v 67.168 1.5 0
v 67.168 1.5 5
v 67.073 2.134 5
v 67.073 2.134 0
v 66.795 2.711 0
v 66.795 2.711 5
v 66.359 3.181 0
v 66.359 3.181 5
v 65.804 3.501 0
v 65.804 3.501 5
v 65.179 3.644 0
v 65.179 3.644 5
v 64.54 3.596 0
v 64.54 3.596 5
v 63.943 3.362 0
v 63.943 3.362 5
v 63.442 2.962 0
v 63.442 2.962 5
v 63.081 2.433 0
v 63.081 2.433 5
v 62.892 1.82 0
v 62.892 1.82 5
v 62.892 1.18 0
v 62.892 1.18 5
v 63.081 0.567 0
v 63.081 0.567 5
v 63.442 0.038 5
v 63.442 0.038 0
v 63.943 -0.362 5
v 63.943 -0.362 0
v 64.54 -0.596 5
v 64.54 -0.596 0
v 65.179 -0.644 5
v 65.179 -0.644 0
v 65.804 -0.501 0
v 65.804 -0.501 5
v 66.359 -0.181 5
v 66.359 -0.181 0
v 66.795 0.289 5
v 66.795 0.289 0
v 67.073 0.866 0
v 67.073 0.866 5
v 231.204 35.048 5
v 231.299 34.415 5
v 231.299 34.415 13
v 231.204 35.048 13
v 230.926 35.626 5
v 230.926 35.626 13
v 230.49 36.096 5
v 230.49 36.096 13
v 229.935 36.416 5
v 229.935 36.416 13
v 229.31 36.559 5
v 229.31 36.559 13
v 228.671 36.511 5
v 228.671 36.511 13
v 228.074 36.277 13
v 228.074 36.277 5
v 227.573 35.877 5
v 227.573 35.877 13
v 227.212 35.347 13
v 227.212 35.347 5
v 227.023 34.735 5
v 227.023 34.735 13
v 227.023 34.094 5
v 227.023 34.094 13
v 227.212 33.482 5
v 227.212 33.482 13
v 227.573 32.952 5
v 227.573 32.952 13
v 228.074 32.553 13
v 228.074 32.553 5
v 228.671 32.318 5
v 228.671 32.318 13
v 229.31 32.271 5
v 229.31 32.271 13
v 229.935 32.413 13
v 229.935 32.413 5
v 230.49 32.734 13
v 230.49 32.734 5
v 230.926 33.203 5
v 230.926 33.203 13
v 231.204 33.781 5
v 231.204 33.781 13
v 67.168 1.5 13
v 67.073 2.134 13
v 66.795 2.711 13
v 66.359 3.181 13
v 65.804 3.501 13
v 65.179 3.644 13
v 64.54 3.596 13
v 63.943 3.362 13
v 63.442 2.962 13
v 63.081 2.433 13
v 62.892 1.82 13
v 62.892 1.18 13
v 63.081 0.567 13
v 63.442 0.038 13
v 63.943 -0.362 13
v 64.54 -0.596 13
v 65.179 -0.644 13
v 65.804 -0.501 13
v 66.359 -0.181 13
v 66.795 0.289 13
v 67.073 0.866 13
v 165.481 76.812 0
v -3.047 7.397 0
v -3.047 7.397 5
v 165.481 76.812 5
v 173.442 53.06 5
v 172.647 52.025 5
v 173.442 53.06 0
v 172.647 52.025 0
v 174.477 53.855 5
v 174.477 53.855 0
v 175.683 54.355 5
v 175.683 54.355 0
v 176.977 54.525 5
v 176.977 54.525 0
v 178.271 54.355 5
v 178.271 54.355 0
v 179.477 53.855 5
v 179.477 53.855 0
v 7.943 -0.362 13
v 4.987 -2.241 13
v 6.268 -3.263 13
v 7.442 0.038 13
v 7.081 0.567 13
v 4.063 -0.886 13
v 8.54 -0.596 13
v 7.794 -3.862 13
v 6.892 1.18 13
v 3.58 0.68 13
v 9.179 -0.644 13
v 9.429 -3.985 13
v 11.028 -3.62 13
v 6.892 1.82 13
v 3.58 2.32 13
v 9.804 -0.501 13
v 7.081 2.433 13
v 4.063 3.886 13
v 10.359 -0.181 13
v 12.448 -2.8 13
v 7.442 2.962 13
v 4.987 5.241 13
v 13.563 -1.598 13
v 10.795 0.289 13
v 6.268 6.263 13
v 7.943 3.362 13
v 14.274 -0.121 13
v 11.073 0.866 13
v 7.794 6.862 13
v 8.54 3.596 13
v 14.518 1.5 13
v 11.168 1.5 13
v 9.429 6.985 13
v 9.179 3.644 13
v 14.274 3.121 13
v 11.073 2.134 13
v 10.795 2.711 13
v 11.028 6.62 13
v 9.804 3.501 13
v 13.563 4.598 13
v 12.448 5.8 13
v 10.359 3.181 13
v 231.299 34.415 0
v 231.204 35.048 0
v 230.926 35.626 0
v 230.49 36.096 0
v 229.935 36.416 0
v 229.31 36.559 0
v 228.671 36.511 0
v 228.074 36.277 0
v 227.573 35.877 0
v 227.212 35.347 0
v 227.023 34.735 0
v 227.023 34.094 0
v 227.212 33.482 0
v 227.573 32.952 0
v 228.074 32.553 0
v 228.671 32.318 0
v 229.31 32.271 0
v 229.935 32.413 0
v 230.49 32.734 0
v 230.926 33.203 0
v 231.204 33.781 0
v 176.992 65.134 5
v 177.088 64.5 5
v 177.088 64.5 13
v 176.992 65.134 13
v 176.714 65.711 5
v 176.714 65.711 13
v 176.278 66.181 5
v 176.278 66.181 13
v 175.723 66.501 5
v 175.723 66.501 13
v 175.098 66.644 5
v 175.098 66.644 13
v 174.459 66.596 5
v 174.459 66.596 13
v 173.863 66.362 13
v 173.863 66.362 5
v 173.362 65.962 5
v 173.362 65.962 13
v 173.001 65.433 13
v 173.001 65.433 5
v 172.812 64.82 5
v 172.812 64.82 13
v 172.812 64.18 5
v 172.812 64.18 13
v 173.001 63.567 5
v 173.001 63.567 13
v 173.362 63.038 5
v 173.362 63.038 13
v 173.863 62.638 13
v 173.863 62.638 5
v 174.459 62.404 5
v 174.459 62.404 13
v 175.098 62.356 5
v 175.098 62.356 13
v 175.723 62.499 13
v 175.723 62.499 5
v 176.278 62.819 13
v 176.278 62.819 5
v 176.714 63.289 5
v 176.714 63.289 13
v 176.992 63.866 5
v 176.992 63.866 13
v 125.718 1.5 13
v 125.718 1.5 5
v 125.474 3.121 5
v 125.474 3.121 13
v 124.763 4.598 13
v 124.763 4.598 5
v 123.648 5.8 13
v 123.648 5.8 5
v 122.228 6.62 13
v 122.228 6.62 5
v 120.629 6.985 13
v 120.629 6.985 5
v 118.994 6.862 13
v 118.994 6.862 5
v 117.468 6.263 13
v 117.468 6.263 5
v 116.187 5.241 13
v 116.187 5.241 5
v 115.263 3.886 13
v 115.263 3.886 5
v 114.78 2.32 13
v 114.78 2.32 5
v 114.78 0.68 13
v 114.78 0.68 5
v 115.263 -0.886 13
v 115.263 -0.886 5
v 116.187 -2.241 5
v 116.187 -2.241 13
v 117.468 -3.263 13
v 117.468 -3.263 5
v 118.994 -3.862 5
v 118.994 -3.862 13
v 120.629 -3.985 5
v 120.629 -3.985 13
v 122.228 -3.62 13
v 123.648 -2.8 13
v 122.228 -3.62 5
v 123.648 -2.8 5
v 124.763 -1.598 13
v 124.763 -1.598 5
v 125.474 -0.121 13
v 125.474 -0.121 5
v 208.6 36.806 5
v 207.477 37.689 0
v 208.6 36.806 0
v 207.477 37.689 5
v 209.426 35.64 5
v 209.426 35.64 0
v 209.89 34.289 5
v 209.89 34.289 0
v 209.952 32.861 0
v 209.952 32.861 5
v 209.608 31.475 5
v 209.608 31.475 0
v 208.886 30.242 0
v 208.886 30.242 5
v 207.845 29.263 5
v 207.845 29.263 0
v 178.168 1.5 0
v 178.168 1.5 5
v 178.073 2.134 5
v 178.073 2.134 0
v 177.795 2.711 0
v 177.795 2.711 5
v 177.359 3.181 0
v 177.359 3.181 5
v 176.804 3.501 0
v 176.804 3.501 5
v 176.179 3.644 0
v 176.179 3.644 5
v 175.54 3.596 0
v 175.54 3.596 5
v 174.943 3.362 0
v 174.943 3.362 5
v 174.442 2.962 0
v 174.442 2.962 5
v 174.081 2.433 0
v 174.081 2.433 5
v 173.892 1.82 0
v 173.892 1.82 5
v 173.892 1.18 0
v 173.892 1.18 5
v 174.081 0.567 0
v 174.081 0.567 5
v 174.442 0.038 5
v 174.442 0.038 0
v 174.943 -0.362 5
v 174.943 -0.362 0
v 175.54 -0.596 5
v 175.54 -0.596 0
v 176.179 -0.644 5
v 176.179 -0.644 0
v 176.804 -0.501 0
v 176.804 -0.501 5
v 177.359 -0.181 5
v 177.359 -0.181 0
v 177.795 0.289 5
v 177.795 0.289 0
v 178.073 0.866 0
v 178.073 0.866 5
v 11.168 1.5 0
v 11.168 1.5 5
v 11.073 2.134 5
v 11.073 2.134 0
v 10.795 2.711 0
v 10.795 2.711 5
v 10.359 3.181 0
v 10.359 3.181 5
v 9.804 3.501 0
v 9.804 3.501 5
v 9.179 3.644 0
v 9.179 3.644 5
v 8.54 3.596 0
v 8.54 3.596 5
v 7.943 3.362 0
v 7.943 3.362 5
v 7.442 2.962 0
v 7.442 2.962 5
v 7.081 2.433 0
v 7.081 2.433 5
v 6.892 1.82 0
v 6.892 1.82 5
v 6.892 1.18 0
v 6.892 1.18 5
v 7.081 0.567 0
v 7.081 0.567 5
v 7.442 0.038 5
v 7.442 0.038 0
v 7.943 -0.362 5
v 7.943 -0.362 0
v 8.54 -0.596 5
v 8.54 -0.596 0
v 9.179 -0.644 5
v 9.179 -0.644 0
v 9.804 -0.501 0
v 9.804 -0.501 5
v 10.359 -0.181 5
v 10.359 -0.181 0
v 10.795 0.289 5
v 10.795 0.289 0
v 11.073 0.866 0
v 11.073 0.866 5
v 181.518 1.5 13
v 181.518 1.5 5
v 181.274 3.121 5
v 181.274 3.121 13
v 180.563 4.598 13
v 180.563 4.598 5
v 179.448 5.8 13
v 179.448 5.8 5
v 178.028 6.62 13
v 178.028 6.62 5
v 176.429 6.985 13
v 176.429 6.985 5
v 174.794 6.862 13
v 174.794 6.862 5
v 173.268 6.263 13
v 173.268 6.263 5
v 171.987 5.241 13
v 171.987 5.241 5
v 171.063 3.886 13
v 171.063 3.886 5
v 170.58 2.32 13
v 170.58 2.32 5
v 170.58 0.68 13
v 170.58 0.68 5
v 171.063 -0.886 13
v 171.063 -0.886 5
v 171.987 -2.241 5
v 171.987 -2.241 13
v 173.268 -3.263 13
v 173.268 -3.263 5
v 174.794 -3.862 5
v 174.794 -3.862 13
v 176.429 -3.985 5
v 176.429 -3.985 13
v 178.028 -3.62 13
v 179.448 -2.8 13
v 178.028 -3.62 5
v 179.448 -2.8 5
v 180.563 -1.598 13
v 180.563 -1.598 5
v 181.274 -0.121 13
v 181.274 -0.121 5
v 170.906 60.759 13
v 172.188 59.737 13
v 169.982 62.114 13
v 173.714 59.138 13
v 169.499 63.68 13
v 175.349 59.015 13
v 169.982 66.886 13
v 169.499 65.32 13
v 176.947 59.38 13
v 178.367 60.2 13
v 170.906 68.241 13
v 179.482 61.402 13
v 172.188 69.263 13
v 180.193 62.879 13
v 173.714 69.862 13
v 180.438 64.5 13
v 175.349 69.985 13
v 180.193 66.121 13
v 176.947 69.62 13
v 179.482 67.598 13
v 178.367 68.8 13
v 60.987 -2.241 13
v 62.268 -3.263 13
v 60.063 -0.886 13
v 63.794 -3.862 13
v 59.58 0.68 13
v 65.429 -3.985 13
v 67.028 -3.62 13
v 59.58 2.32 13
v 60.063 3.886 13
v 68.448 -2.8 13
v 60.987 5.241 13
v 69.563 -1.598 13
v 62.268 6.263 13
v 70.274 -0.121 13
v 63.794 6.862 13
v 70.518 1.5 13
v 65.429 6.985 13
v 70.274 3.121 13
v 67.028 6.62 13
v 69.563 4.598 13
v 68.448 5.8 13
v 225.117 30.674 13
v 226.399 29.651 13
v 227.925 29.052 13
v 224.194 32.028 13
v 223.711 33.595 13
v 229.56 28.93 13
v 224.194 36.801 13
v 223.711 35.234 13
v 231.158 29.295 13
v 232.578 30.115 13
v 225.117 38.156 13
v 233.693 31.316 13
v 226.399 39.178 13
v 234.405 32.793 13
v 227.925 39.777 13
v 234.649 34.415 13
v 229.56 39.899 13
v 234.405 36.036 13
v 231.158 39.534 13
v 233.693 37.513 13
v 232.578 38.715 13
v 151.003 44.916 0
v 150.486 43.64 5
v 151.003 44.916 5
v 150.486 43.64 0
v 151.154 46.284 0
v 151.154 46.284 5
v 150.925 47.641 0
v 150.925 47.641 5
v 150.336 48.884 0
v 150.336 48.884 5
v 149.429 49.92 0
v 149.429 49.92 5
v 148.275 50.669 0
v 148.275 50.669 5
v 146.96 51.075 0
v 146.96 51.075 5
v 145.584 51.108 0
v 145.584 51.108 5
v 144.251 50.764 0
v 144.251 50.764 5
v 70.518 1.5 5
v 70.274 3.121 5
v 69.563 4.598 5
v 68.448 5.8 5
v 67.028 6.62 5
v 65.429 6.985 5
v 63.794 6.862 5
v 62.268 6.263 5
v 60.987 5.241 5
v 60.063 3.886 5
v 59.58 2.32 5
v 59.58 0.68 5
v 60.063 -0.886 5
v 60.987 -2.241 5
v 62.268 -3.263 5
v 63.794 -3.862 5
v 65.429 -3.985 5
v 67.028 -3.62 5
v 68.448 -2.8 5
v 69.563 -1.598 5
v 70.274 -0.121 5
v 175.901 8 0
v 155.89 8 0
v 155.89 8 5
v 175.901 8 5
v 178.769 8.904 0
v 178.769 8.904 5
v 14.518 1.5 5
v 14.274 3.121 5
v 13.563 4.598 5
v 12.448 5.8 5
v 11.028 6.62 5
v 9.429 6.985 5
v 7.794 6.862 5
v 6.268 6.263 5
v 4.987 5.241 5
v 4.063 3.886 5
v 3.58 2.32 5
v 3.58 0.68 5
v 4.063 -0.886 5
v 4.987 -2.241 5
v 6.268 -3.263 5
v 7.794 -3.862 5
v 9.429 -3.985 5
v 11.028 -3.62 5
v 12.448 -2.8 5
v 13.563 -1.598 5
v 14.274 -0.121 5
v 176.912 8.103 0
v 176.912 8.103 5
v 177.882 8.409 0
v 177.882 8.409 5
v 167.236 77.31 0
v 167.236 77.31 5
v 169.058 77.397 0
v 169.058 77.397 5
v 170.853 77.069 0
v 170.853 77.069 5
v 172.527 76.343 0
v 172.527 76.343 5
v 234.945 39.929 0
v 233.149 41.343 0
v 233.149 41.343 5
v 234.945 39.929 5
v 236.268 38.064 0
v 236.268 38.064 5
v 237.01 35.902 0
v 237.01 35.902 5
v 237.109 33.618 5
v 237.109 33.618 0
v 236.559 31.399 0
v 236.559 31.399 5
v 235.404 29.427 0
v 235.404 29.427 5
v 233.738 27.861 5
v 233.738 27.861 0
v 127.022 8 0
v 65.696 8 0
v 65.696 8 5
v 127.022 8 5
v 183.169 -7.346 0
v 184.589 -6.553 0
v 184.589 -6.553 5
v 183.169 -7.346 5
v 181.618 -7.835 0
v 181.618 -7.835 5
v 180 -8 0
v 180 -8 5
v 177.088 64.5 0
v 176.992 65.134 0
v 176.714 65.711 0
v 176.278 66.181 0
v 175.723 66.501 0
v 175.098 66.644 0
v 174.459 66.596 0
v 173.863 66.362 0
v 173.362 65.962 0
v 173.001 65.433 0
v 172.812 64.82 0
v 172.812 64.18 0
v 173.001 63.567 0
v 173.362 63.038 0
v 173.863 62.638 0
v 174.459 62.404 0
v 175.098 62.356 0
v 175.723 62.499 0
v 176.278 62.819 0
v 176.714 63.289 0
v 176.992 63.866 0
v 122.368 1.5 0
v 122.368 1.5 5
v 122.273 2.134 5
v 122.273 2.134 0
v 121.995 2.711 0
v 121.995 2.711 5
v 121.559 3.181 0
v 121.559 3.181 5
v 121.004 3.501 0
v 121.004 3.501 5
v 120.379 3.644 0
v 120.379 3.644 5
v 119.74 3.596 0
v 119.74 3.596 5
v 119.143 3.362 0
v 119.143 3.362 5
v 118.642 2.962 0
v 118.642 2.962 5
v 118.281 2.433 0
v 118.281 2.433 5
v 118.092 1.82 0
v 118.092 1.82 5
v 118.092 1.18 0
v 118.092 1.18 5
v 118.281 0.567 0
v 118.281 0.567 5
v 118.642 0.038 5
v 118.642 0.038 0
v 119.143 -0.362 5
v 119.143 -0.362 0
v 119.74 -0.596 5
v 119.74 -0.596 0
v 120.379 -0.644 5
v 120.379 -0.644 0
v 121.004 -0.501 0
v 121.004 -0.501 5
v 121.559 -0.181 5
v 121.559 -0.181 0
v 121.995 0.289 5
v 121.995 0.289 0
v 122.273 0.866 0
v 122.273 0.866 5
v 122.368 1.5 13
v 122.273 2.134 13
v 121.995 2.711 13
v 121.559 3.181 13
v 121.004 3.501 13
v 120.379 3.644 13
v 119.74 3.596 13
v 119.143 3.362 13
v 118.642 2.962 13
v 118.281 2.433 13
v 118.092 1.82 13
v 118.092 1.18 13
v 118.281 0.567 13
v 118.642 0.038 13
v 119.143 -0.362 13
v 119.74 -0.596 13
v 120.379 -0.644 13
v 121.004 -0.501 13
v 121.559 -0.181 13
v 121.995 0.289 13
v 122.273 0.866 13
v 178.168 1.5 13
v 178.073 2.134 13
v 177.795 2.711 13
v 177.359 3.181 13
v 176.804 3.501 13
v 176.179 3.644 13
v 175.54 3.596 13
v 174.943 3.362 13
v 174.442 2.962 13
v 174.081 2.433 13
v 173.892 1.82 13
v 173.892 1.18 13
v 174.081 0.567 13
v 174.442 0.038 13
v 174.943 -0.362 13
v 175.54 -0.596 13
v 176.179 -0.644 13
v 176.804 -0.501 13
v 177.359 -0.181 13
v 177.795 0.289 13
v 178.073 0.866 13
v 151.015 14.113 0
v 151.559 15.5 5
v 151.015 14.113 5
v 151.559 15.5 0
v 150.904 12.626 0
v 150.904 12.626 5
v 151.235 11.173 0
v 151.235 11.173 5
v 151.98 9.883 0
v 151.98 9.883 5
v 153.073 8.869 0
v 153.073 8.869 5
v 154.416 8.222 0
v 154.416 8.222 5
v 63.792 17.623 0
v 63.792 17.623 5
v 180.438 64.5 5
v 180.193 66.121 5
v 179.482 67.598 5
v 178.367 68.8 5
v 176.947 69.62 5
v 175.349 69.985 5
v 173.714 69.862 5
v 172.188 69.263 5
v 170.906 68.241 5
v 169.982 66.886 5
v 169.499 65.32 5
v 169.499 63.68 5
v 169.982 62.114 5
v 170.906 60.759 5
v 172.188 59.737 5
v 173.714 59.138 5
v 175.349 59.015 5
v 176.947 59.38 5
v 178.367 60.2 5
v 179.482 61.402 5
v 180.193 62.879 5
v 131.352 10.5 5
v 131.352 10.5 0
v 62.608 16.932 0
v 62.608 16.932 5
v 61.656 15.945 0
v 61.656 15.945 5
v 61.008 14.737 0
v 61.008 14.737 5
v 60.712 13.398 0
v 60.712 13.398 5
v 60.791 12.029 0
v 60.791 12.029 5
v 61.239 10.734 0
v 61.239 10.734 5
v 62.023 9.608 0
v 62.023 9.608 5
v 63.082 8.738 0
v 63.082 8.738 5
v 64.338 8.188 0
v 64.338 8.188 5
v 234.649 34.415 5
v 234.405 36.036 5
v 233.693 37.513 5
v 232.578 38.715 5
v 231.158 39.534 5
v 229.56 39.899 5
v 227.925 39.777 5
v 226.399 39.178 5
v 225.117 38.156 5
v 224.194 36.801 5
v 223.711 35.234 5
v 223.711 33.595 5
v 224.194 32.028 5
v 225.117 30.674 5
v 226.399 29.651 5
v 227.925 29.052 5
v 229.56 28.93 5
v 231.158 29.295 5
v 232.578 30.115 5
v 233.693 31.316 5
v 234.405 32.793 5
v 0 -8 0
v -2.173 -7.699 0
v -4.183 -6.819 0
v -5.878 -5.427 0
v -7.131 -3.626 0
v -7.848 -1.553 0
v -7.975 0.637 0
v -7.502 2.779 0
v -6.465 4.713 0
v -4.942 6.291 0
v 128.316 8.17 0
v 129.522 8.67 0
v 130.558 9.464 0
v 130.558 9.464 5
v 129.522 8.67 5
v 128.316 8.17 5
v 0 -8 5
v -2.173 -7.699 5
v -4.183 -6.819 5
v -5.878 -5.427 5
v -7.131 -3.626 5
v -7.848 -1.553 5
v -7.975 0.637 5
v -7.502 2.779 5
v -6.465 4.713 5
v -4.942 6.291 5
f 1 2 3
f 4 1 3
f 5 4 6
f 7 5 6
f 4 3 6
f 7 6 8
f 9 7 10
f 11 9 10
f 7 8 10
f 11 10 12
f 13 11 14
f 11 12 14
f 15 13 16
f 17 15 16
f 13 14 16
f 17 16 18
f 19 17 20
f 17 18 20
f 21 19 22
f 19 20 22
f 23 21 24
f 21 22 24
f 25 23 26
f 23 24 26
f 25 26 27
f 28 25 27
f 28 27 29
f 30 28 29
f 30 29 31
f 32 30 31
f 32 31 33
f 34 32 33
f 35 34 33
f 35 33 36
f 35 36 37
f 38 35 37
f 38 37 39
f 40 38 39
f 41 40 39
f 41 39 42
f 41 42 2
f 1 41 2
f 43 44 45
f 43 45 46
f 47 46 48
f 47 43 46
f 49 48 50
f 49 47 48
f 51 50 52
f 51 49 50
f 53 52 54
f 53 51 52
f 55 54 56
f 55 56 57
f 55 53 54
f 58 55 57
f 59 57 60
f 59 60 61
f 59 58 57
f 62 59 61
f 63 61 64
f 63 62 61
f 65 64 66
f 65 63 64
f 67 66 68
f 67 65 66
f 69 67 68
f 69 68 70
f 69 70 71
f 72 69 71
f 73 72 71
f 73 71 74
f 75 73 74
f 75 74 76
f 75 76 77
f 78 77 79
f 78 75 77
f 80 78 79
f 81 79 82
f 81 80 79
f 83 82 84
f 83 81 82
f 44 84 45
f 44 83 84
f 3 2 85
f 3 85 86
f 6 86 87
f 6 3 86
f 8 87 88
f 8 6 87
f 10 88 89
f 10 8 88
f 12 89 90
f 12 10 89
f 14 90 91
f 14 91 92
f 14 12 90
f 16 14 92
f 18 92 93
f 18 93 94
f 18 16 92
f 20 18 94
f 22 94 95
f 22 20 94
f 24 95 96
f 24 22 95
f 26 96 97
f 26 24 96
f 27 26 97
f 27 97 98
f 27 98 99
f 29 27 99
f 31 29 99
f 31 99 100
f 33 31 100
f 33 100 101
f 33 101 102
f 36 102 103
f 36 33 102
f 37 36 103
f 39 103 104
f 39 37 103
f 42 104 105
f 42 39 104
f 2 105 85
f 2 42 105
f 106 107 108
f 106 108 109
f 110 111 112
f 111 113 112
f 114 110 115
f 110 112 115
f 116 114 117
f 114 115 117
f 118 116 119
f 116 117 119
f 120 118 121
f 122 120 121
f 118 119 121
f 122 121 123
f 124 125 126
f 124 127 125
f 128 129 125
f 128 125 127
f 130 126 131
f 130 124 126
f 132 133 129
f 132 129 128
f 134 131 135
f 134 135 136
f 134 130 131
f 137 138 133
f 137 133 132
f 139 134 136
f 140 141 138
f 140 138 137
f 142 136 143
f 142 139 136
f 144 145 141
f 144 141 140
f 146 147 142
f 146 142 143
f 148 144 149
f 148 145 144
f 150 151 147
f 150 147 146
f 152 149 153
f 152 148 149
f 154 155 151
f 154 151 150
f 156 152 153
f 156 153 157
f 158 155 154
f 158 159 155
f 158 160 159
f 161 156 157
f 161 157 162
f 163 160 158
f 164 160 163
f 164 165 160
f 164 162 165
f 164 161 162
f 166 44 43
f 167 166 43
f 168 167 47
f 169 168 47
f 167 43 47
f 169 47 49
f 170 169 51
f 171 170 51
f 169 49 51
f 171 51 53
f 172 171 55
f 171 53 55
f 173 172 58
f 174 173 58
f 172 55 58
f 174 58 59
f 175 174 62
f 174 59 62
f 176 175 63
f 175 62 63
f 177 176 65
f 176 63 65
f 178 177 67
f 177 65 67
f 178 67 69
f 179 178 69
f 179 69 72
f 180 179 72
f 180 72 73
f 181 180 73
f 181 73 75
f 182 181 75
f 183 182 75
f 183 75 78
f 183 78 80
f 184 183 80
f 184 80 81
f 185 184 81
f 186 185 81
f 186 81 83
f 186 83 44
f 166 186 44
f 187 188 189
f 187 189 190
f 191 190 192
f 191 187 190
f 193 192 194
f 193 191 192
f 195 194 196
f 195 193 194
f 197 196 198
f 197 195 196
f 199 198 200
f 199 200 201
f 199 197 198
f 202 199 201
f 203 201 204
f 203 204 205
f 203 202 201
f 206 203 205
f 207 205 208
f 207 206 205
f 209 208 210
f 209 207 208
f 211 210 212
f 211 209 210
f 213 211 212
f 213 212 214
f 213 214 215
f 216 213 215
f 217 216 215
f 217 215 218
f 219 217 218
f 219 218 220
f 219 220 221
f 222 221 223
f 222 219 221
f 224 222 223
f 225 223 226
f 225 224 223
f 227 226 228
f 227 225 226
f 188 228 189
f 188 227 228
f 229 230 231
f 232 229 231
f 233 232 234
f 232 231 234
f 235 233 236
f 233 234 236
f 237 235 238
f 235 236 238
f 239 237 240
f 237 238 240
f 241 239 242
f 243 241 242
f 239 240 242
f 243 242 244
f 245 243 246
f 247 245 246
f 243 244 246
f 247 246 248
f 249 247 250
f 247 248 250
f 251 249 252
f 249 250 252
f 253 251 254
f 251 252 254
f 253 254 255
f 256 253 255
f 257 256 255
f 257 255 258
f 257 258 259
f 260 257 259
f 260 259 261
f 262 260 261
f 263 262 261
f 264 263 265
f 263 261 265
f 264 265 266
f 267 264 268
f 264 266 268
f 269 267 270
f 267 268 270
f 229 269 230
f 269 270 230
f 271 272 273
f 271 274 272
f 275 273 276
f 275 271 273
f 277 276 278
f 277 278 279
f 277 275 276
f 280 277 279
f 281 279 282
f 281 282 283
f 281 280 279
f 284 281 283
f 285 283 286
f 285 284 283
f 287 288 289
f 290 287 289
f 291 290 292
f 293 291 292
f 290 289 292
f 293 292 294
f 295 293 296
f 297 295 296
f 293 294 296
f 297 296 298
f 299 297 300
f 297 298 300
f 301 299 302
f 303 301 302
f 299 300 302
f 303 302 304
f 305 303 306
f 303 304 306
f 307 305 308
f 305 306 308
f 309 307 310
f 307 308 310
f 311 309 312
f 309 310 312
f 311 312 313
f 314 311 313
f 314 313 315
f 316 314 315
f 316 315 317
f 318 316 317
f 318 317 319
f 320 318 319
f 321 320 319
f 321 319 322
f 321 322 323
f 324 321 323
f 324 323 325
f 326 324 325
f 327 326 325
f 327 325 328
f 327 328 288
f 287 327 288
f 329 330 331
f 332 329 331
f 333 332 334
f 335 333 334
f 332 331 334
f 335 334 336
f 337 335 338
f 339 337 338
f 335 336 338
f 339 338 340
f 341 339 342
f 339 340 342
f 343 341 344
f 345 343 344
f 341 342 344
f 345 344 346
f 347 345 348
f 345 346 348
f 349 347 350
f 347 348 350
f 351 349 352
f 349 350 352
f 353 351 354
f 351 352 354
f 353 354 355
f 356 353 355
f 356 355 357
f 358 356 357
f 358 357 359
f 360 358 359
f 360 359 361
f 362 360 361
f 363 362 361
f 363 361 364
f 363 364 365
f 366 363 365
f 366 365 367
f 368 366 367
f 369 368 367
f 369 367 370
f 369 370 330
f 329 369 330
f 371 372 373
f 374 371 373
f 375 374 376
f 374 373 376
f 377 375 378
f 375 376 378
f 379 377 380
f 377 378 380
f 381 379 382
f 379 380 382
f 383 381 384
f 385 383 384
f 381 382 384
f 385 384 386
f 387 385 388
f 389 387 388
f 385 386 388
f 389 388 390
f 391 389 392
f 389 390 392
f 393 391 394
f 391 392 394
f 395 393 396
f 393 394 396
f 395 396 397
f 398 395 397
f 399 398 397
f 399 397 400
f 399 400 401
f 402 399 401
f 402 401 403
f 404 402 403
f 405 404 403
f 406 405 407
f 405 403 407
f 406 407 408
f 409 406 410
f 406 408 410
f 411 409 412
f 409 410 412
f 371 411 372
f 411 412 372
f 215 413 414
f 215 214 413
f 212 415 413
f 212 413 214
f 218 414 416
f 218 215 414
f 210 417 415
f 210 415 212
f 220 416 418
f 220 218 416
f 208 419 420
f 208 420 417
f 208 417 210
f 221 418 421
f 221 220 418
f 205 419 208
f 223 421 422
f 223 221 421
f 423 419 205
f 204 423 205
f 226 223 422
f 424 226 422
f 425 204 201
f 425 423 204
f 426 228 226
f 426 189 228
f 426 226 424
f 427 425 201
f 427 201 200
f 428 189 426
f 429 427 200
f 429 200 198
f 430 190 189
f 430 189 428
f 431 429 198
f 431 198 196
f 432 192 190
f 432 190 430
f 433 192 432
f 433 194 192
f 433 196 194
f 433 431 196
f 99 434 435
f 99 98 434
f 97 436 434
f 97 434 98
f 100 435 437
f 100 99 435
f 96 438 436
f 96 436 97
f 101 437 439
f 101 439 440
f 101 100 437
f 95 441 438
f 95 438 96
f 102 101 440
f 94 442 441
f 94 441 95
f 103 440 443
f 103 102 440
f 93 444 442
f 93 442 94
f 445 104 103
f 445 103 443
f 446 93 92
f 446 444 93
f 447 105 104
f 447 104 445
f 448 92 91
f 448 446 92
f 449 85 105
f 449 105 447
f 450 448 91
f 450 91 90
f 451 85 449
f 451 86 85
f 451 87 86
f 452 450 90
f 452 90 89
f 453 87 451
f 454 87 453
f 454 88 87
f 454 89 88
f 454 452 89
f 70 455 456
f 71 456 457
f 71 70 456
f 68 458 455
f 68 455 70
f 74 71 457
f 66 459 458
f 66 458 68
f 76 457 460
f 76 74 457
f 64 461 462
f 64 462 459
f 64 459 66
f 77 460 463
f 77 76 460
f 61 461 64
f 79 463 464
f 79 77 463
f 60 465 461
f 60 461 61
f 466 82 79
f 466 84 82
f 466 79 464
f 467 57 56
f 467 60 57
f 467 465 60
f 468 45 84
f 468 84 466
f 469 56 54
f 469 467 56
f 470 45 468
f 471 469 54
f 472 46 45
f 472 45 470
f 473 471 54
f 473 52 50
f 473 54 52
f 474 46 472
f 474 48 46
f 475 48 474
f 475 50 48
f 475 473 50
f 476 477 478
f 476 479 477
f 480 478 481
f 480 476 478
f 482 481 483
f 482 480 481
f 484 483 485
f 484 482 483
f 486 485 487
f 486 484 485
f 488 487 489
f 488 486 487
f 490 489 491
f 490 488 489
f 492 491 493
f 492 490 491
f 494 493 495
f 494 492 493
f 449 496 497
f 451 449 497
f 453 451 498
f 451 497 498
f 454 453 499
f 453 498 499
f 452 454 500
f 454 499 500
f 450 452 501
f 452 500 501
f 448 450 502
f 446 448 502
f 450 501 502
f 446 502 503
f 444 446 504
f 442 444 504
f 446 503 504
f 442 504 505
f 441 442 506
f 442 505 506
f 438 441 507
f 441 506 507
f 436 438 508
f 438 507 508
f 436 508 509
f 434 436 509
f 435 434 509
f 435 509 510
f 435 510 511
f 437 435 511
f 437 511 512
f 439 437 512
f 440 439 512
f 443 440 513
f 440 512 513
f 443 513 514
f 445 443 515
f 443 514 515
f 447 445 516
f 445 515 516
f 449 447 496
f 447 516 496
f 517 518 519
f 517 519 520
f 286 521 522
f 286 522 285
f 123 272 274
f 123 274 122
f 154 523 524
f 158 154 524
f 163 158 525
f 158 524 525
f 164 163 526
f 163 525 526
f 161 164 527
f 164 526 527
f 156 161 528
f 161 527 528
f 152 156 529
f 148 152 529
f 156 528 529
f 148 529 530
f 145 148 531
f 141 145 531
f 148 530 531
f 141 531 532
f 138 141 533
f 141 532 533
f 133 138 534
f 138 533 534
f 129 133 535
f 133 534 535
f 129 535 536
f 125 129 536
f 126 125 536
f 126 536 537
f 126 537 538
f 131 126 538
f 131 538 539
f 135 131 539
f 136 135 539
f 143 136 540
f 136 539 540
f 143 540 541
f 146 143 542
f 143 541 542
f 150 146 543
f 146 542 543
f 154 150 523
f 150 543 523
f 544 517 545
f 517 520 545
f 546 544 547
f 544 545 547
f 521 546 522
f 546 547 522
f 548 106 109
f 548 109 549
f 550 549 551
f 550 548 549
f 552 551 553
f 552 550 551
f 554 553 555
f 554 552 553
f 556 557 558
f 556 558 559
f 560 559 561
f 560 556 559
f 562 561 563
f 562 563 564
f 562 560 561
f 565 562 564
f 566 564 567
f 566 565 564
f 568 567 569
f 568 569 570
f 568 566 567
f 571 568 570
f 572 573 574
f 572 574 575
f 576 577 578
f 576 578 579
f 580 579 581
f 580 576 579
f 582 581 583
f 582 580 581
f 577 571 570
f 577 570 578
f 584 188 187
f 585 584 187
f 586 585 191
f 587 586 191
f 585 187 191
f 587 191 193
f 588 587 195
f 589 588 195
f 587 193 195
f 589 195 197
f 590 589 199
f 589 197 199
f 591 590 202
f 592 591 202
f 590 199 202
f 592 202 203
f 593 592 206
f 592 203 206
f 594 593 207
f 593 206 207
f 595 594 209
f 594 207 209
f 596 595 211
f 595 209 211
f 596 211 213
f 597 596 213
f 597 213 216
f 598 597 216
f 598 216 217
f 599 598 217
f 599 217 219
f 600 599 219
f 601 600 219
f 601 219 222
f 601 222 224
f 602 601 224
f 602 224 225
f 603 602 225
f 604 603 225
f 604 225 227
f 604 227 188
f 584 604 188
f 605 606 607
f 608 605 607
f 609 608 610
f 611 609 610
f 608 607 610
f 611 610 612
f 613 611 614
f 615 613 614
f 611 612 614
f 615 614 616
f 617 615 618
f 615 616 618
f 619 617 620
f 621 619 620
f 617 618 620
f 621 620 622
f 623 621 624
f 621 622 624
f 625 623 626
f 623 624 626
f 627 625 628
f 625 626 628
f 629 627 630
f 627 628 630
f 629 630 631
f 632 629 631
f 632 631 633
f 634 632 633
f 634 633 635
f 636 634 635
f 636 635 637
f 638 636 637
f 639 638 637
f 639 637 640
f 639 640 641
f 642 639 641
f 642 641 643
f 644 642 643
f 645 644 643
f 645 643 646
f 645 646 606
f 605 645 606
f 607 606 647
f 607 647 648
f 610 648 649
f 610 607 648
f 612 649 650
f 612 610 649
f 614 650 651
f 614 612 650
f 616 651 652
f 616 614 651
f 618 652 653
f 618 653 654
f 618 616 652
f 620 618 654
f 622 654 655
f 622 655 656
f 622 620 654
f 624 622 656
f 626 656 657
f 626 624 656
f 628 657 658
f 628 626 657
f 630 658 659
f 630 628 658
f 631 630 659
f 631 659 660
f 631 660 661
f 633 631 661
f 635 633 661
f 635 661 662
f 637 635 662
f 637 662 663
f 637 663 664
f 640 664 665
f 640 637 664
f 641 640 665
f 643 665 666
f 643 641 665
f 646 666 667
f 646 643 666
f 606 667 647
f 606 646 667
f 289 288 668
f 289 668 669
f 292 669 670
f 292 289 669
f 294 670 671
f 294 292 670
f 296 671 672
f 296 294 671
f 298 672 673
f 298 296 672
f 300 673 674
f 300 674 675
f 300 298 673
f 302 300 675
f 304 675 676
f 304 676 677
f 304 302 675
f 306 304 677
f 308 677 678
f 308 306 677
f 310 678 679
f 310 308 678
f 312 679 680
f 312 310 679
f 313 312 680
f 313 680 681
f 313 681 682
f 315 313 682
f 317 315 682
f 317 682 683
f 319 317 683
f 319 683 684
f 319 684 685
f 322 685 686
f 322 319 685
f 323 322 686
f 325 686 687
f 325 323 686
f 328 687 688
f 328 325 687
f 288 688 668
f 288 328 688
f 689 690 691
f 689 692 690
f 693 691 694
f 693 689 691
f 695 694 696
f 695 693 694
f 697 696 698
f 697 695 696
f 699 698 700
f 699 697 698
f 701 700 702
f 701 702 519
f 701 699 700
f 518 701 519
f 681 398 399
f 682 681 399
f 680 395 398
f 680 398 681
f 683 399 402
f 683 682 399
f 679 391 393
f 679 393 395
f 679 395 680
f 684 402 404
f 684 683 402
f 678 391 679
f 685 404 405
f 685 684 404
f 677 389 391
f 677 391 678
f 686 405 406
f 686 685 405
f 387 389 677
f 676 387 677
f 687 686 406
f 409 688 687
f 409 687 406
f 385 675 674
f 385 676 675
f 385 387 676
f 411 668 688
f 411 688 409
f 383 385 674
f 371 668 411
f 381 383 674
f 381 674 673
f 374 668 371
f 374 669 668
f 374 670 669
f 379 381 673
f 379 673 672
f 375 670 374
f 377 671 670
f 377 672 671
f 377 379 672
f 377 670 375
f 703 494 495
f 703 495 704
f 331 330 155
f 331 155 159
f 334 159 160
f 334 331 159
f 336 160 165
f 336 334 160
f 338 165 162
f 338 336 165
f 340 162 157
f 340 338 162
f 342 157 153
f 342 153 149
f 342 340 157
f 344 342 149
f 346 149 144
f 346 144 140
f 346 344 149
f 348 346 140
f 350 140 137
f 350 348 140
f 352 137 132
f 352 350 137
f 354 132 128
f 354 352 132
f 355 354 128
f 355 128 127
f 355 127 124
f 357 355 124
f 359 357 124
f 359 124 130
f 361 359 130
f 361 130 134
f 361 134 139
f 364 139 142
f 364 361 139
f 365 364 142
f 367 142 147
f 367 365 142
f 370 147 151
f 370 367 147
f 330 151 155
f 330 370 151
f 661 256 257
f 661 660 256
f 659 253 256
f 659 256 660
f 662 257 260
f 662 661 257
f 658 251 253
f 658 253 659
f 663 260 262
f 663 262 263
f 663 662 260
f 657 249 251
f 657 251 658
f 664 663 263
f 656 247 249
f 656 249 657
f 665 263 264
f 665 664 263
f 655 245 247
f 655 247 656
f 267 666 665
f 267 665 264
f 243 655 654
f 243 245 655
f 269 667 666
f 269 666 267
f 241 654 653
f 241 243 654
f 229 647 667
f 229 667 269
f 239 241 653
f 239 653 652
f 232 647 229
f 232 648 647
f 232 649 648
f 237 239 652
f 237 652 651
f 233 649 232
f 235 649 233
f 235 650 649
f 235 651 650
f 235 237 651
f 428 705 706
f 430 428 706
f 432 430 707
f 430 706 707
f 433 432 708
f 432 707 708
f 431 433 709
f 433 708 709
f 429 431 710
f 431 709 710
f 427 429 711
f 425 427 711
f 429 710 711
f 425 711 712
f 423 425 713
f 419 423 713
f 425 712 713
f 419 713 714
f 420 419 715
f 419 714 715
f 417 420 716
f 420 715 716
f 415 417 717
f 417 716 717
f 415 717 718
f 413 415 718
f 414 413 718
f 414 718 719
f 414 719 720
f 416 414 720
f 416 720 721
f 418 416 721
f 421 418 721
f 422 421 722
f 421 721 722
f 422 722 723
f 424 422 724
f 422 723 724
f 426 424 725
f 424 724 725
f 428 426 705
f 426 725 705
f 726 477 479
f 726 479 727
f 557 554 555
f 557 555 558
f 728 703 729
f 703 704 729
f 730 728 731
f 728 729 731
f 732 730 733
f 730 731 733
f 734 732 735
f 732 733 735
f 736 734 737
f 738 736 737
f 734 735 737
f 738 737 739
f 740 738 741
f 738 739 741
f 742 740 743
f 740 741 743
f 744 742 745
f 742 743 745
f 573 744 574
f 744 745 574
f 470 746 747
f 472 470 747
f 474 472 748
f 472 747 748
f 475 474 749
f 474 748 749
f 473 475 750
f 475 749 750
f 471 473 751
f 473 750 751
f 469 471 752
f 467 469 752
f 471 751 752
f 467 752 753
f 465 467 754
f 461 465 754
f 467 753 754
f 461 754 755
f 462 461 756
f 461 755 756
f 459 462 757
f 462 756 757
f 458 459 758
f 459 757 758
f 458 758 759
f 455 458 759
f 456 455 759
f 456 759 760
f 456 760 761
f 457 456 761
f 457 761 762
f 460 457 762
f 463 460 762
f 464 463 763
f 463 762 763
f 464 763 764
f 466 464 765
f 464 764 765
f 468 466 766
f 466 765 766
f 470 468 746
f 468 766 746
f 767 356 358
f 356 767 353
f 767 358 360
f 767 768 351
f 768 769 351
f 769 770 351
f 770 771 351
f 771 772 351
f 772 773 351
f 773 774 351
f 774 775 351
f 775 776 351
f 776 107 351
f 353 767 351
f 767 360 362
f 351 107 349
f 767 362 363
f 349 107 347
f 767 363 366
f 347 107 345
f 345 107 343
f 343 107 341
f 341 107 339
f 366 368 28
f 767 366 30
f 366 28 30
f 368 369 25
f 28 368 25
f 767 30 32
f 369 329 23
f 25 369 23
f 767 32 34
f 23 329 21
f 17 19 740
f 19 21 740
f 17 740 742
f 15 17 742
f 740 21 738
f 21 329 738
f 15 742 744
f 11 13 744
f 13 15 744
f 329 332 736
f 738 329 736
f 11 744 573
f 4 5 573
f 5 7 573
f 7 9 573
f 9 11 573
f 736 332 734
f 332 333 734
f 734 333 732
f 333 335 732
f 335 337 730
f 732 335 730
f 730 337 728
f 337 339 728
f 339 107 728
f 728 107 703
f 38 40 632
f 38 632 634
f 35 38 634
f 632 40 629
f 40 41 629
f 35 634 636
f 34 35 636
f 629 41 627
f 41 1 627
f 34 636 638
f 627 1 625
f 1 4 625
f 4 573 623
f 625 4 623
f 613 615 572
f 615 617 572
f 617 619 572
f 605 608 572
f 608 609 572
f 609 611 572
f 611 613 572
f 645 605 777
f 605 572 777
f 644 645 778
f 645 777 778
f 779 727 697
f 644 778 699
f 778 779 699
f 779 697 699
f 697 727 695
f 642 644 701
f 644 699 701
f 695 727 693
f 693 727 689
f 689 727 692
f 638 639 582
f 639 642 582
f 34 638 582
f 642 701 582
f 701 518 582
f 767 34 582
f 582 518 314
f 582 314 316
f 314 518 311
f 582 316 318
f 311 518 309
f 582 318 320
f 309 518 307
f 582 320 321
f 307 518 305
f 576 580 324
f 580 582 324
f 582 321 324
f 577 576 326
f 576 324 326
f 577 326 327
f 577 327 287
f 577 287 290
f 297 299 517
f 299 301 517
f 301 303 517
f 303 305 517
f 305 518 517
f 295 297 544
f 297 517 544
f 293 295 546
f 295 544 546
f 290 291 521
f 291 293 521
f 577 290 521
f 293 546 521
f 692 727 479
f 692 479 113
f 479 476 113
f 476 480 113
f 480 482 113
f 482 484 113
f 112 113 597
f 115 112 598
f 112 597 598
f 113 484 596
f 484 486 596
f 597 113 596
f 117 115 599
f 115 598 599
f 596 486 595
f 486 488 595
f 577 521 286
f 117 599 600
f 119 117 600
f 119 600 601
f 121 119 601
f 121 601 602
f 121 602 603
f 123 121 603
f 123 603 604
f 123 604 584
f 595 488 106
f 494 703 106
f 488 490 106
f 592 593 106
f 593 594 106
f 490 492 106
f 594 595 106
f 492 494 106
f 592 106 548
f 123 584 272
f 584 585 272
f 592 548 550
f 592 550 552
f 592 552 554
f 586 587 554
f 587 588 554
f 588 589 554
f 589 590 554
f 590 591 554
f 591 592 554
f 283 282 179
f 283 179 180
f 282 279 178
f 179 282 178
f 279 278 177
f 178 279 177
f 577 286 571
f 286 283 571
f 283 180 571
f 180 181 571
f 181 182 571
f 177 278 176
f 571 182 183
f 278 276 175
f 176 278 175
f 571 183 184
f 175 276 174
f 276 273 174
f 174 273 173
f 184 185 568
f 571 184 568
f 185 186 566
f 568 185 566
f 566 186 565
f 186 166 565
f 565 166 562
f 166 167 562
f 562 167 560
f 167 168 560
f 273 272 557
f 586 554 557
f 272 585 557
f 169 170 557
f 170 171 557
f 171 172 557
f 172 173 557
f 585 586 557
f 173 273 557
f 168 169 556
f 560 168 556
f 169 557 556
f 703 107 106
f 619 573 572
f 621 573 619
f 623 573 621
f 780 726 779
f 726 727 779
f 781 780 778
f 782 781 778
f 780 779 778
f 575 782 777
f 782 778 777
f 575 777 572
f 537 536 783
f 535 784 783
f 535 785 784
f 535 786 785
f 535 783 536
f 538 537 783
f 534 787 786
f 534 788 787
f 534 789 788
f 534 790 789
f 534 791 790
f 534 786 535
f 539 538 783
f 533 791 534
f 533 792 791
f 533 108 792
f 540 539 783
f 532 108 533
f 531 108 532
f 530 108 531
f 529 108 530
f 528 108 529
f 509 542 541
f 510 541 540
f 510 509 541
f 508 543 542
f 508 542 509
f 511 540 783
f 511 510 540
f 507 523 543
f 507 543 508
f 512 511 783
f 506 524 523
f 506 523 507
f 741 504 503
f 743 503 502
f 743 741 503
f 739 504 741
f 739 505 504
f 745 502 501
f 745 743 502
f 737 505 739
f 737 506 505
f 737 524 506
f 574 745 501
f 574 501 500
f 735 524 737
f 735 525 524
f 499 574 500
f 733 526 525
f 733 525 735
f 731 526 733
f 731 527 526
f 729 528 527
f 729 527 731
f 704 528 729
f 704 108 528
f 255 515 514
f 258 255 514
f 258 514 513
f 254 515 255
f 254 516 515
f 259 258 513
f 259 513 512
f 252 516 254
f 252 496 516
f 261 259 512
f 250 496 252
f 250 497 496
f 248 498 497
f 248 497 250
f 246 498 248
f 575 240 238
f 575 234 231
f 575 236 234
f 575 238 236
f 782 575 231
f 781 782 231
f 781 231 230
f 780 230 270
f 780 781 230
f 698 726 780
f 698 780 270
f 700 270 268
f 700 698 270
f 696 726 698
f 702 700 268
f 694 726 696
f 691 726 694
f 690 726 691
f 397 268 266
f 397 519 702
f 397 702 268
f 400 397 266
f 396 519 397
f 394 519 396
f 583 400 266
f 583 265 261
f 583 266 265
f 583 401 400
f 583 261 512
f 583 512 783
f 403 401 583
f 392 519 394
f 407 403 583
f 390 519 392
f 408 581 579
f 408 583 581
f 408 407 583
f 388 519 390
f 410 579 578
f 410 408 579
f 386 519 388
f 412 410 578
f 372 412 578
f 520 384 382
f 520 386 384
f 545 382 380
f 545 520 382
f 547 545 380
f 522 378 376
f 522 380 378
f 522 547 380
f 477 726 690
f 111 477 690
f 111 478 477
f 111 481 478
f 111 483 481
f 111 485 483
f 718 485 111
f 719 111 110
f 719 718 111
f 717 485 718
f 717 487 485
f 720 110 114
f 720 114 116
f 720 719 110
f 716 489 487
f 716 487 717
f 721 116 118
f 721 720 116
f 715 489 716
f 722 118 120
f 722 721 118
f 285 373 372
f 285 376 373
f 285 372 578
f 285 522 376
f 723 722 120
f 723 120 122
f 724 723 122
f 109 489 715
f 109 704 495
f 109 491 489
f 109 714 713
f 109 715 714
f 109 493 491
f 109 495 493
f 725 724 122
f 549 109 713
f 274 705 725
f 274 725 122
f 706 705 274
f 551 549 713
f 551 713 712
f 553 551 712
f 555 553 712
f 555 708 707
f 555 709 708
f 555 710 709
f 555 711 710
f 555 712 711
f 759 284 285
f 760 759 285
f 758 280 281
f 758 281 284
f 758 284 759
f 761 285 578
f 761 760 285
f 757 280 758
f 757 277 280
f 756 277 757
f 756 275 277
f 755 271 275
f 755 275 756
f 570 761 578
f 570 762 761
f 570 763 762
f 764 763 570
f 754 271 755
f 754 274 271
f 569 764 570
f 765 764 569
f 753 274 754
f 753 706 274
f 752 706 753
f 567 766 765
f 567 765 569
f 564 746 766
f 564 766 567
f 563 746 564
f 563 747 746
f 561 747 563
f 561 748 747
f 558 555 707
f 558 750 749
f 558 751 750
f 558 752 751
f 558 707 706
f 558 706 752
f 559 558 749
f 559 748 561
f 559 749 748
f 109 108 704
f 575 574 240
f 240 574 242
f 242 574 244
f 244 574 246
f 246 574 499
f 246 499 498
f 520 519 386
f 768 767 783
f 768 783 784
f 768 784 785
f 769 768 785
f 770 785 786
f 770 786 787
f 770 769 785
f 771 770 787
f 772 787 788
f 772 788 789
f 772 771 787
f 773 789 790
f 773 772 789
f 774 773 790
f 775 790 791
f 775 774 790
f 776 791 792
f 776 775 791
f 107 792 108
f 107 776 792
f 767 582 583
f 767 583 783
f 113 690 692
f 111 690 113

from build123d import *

# Parameters (mm, degrees)
BOSS_EXTRUDE1_DEPTH = 5
BOSS_EXTRUDE2_DEPTH = 5
FILLET1_R           = 5
SKETCH3_R           = 5.5
SKETCH3_R_2         = 2.15
BOSS_EXTRUDE3_DEPTH = 8
SKETCH4_R           = 2.15
CUT_EXTRUDE1_DEPTH  = 6


with BuildPart() as part:
    # Sketch1 → Boss-Extrude1 (new body)
    with BuildSketch(Plane.XY):
        with BuildLine():
            Line((0, 8), (180, 8))
            ThreePointArc((180, 8), (188, 0), (180, -8))
            Line((180, -8), (0, -8))
            ThreePointArc((0, -8), (-8, 0), (0, 8))
        make_face()
        with BuildLine():
            Line((175.411388509, 6.553216354), (224.560511167, 40.967802535))
            ThreePointArc((224.560511167, 40.967802535), (235.702339012, 39.003197672), (233.737734148, 27.861369827))
            Line((233.737734148, 27.861369827), (184.588611491, -6.553216354))
            ThreePointArc((184.588611491, -6.553216354), (173.446783646, -4.588611491), (175.411388509, 6.553216354))
        make_face()
        with BuildLine():
            Line((225.149122657, 27.486382951), (164.527344392, 62.486382951))
            ThreePointArc((164.527344392, 62.486382951), (161.599141162, 73.414586181), (172.527344392, 76.342789411))
            Line((172.527344392, 76.342789411), (233.149122657, 41.342789411))
            ThreePointArc((233.149122657, 41.342789411), (236.077325888, 30.414586181), (225.149122657, 27.486382951))
        make_face()
        with BuildLine():
            Line((-3.04678556, 7.397100632), (165.480558833, 76.811686813))
            ThreePointArc((165.480558833, 76.811686813), (175.924445024, 72.461371741), (171.574129952, 62.017485549))
            Line((171.574129952, 62.017485549), (3.04678556, -7.397100632))
            ThreePointArc((3.04678556, -7.397100632), (-7.397100632, -3.04678556), (-3.04678556, 7.397100632))
        make_face()
    extrude(amount=BOSS_EXTRUDE1_DEPTH)

    # Sketch2 → Boss-Extrude2 (add)
    with BuildSketch(Plane.XY.offset(5)):
        Polygon((147.229345289, 8), (175.147140962, 56.355040542), (167.935409097, 60.518735876), (157.826632887, 56.355040542), (129.908837213, 8), align=None)
    extrude(amount=-BOSS_EXTRUDE2_DEPTH)

    # Fillet1
    fillet1_edges = [part.edges().sort_by_distance(p)[0] for p in [
        (40.428445864, 8, 2.5),
        (177.477609689, 8, 2.5),
        (214.274021971, 33.765125259, 2.5),
        (157.826632887, 56.355040542, 2.5),
        (129.908837213, 8, 2.5),
        (147.229345289, 8, 2.5),
        (175.147140962, 56.355040542, 2.5),
    ]]
    fillet(fillet1_edges, radius=FILLET1_R)

    # Sketch3 → Boss-Extrude3 (add)
    with BuildSketch(Plane.XY.offset(5)):
        with Locations((174.937796577, 64.5)):
            Circle(SKETCH3_R)
        with Locations((174.937796577, 64.5)):
            Circle(SKETCH3_R_2, mode=Mode.SUBTRACT)
        with Locations((229.149122657, 34.414586181)):
            Circle(SKETCH3_R)
        with Locations((229.149122657, 34.414586181)):
            Circle(SKETCH3_R_2, mode=Mode.SUBTRACT)
        with Locations((176.018340463, 1.5)):
            Circle(SKETCH3_R)
        with Locations((176.018340463, 1.5)):
            Circle(SKETCH3_R_2, mode=Mode.SUBTRACT)
        with Locations((120.218340463, 1.5)):
            Circle(SKETCH3_R)
        with Locations((120.218340463, 1.5)):
            Circle(SKETCH3_R_2, mode=Mode.SUBTRACT)
        with Locations((65.018340463, 1.5)):
            Circle(SKETCH3_R)
        with Locations((65.018340463, 1.5)):
            Circle(SKETCH3_R_2, mode=Mode.SUBTRACT)
        with Locations((9.018340463, 1.5)):
            Circle(SKETCH3_R)
        with Locations((9.018340463, 1.5)):
            Circle(SKETCH3_R_2, mode=Mode.SUBTRACT)
    extrude(amount=BOSS_EXTRUDE3_DEPTH)

    # Sketch4 → Cut-Extrude1 (cut, through all)
    with BuildSketch(Plane.XY.offset(5)):
        with Locations((9.018340463, 1.5)):
            Circle(SKETCH4_R)
        with Locations((65.018340463, 1.5)):
            Circle(SKETCH4_R)
        with Locations((120.218340463, 1.5)):
            Circle(SKETCH4_R)
        with Locations((176.018340463, 1.5)):
            Circle(SKETCH4_R)
        with Locations((229.149122657, 34.414586181)):
            Circle(SKETCH4_R)
        with Locations((174.937796577, 64.5)):
            Circle(SKETCH4_R)
    extrude(amount=-CUT_EXTRUDE1_DEPTH, mode=Mode.SUBTRACT)


solid = part.part
